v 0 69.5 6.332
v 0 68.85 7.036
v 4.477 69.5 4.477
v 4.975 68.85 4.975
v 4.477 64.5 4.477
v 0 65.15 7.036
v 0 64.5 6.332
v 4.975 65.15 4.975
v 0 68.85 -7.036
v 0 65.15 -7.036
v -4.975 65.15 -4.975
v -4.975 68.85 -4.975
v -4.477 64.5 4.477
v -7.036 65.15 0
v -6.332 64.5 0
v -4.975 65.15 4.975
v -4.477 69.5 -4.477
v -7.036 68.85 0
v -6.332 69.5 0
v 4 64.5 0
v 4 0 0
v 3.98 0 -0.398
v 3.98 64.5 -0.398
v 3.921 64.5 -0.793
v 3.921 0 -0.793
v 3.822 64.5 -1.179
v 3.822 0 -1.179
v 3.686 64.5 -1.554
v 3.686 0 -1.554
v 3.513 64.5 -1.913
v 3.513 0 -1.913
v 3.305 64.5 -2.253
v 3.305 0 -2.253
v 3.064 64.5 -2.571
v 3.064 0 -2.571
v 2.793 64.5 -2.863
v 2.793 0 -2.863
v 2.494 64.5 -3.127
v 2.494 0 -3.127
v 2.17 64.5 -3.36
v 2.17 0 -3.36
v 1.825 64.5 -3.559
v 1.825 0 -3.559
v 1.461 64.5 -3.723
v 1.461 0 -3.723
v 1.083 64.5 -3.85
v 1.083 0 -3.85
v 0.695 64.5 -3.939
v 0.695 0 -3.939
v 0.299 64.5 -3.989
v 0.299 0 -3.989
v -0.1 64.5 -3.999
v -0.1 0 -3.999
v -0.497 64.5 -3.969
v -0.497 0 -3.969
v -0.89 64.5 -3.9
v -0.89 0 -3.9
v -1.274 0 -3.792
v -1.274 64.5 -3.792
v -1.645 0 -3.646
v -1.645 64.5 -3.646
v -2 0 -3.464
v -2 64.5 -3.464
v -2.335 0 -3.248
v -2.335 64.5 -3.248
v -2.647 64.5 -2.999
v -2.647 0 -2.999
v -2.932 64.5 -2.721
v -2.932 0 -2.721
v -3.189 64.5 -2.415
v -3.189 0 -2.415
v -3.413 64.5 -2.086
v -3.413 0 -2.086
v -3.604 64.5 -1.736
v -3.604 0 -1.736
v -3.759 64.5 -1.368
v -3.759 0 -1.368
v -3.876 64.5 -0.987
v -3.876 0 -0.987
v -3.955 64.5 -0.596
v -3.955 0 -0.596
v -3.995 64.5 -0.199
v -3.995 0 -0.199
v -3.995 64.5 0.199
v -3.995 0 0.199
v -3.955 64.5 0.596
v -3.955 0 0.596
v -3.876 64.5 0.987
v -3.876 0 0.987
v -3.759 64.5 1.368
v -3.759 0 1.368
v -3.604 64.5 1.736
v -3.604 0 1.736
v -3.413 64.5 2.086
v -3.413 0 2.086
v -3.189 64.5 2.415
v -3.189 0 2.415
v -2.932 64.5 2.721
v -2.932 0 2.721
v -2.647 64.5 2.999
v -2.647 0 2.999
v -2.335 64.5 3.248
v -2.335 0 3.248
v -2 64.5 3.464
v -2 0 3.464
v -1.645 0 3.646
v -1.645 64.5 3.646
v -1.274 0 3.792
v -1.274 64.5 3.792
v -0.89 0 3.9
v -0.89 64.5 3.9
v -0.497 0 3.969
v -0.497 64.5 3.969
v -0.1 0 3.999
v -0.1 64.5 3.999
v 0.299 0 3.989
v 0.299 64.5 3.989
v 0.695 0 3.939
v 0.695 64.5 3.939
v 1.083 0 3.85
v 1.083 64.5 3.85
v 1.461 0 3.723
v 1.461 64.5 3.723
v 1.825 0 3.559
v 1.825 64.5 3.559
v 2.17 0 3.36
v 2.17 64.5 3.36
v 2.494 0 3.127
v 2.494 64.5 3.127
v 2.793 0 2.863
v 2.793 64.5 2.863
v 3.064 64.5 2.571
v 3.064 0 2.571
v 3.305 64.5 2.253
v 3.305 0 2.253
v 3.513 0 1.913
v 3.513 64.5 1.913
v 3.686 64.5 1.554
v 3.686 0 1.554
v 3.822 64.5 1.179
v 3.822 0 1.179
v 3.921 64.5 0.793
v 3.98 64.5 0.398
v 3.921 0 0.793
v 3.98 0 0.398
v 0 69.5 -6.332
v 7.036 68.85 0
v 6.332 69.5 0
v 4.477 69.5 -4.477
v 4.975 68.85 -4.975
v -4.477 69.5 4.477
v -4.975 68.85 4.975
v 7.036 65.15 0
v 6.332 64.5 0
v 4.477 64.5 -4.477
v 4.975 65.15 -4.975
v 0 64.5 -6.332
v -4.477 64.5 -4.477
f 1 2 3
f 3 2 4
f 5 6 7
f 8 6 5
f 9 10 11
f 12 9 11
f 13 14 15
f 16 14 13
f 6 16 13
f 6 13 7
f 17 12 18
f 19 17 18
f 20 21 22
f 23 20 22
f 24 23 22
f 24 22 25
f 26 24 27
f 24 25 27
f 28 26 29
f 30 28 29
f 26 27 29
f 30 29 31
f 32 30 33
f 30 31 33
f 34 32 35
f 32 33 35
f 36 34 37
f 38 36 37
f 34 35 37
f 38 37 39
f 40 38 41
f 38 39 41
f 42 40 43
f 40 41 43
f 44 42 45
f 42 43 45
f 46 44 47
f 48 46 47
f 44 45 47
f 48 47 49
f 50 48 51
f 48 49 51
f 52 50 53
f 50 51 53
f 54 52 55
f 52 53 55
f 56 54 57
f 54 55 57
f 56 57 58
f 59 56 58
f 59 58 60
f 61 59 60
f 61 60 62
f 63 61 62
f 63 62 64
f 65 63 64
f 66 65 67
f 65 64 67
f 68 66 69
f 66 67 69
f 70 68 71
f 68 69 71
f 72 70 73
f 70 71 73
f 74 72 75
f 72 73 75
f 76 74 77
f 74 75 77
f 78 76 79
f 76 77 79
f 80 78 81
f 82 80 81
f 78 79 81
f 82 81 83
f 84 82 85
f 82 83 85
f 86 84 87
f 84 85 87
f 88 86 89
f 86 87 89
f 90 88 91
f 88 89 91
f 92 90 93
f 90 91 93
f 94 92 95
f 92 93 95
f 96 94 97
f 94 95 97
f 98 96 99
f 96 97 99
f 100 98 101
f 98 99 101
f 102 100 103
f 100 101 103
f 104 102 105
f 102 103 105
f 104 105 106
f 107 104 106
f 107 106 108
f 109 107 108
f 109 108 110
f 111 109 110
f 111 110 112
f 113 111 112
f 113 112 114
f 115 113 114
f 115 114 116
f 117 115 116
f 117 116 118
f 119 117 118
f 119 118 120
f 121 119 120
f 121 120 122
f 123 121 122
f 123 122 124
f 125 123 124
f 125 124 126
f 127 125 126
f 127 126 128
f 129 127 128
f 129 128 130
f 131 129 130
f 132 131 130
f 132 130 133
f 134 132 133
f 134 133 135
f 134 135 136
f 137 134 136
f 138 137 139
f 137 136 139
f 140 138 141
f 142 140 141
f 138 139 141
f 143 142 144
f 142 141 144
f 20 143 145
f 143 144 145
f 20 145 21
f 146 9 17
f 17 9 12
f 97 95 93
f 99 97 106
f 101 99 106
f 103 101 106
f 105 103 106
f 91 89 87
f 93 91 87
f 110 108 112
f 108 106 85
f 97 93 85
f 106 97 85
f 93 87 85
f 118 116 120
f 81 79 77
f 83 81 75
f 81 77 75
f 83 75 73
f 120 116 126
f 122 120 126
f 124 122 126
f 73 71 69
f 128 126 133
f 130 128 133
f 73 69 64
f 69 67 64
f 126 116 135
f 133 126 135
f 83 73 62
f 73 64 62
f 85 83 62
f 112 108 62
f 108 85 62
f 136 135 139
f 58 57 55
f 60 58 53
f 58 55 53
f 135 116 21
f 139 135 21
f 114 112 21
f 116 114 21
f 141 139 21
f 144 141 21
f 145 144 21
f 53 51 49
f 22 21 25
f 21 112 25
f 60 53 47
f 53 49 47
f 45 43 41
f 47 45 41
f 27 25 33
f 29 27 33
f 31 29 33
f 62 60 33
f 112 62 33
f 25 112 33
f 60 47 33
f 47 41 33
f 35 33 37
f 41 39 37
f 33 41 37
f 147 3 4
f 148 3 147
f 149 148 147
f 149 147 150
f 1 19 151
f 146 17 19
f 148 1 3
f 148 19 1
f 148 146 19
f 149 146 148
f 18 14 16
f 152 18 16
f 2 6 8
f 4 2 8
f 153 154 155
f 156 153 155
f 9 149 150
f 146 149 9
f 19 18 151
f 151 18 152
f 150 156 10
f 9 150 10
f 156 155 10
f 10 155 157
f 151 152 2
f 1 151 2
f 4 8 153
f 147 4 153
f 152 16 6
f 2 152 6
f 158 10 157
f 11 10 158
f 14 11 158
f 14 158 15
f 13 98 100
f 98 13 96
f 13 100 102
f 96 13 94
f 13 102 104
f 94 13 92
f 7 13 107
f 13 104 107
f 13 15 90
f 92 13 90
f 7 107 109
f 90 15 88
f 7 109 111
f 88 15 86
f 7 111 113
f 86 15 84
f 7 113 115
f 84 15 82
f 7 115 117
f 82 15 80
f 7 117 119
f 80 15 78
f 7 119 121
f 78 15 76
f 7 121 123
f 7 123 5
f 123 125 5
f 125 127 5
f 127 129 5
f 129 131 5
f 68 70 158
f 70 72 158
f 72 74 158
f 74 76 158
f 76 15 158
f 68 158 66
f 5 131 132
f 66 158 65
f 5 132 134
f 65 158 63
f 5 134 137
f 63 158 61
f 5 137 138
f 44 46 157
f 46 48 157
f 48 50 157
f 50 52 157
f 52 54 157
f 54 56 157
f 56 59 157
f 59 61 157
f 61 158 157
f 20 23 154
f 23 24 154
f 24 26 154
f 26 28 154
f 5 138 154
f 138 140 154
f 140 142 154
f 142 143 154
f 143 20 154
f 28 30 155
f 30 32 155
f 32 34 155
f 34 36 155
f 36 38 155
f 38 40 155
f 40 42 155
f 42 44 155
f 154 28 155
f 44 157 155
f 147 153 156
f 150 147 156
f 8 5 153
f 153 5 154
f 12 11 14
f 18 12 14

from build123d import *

# Parameters (mm, degrees)
SKETCH1_R           = 4
BOSS_EXTRUDE1_DEPTH = 64.5
BOSS_EXTRUDE2_DEPTH = 5
CHAMFER1_SIZE       = 0.65


with BuildPart() as part:
    # Sketch1 → Boss-Extrude1 (new body)
    with BuildSketch(Plane(origin=(0, 0, 0), x_dir=(1, 0, 0), z_dir=(0, 1, 0))):
        Circle(SKETCH1_R)
    extrude(amount=BOSS_EXTRUDE1_DEPTH)

    # Sketch2 → Boss-Extrude2 (add)
    with BuildSketch(Plane(origin=(0, 64.5, 0), x_dir=(1, 0, 0), z_dir=(0, 1, 0))):
        Polygon((7.035549302, 0), (4.974884621, 4.974884621), (0, 7.035549302), (-4.974884621, 4.974884621), (-7.035549302, 0), (-4.974884621, -4.974884621), (0, -7.035549302), (4.974884621, -4.974884621), align=None)
    extrude(amount=BOSS_EXTRUDE2_DEPTH)

    # Chamfer1
    chamfer1_edges = [part.edges().sort_by_distance(p)[0] for p in [
        (-6.005216961, 69.5, 2.48744231),
        (-2.48744231, 69.5, 6.005216961),
        (2.48744231, 69.5, 6.005216961),
        (6.005216961, 64.5, 2.48744231),
        (6.005216961, 64.5, -2.48744231),
        (2.48744231, 64.5, -6.005216961),
        (-2.48744231, 64.5, -6.005216961),
        (-6.005216961, 64.5, -2.48744231),
        (-6.005216961, 64.5, 2.48744231),
        (-2.48744231, 64.5, 6.005216961),
        (2.48744231, 64.5, 6.005216961),
        (6.005216961, 69.5, 2.48744231),
        (6.005216961, 69.5, -2.48744231),
        (2.48744231, 69.5, -6.005216961),
        (-2.48744231, 69.5, -6.005216961),
        (-6.005216961, 69.5, -2.48744231),
    ]]
    chamfer(chamfer1_edges, length=CHAMFER1_SIZE)


solid = part.part
